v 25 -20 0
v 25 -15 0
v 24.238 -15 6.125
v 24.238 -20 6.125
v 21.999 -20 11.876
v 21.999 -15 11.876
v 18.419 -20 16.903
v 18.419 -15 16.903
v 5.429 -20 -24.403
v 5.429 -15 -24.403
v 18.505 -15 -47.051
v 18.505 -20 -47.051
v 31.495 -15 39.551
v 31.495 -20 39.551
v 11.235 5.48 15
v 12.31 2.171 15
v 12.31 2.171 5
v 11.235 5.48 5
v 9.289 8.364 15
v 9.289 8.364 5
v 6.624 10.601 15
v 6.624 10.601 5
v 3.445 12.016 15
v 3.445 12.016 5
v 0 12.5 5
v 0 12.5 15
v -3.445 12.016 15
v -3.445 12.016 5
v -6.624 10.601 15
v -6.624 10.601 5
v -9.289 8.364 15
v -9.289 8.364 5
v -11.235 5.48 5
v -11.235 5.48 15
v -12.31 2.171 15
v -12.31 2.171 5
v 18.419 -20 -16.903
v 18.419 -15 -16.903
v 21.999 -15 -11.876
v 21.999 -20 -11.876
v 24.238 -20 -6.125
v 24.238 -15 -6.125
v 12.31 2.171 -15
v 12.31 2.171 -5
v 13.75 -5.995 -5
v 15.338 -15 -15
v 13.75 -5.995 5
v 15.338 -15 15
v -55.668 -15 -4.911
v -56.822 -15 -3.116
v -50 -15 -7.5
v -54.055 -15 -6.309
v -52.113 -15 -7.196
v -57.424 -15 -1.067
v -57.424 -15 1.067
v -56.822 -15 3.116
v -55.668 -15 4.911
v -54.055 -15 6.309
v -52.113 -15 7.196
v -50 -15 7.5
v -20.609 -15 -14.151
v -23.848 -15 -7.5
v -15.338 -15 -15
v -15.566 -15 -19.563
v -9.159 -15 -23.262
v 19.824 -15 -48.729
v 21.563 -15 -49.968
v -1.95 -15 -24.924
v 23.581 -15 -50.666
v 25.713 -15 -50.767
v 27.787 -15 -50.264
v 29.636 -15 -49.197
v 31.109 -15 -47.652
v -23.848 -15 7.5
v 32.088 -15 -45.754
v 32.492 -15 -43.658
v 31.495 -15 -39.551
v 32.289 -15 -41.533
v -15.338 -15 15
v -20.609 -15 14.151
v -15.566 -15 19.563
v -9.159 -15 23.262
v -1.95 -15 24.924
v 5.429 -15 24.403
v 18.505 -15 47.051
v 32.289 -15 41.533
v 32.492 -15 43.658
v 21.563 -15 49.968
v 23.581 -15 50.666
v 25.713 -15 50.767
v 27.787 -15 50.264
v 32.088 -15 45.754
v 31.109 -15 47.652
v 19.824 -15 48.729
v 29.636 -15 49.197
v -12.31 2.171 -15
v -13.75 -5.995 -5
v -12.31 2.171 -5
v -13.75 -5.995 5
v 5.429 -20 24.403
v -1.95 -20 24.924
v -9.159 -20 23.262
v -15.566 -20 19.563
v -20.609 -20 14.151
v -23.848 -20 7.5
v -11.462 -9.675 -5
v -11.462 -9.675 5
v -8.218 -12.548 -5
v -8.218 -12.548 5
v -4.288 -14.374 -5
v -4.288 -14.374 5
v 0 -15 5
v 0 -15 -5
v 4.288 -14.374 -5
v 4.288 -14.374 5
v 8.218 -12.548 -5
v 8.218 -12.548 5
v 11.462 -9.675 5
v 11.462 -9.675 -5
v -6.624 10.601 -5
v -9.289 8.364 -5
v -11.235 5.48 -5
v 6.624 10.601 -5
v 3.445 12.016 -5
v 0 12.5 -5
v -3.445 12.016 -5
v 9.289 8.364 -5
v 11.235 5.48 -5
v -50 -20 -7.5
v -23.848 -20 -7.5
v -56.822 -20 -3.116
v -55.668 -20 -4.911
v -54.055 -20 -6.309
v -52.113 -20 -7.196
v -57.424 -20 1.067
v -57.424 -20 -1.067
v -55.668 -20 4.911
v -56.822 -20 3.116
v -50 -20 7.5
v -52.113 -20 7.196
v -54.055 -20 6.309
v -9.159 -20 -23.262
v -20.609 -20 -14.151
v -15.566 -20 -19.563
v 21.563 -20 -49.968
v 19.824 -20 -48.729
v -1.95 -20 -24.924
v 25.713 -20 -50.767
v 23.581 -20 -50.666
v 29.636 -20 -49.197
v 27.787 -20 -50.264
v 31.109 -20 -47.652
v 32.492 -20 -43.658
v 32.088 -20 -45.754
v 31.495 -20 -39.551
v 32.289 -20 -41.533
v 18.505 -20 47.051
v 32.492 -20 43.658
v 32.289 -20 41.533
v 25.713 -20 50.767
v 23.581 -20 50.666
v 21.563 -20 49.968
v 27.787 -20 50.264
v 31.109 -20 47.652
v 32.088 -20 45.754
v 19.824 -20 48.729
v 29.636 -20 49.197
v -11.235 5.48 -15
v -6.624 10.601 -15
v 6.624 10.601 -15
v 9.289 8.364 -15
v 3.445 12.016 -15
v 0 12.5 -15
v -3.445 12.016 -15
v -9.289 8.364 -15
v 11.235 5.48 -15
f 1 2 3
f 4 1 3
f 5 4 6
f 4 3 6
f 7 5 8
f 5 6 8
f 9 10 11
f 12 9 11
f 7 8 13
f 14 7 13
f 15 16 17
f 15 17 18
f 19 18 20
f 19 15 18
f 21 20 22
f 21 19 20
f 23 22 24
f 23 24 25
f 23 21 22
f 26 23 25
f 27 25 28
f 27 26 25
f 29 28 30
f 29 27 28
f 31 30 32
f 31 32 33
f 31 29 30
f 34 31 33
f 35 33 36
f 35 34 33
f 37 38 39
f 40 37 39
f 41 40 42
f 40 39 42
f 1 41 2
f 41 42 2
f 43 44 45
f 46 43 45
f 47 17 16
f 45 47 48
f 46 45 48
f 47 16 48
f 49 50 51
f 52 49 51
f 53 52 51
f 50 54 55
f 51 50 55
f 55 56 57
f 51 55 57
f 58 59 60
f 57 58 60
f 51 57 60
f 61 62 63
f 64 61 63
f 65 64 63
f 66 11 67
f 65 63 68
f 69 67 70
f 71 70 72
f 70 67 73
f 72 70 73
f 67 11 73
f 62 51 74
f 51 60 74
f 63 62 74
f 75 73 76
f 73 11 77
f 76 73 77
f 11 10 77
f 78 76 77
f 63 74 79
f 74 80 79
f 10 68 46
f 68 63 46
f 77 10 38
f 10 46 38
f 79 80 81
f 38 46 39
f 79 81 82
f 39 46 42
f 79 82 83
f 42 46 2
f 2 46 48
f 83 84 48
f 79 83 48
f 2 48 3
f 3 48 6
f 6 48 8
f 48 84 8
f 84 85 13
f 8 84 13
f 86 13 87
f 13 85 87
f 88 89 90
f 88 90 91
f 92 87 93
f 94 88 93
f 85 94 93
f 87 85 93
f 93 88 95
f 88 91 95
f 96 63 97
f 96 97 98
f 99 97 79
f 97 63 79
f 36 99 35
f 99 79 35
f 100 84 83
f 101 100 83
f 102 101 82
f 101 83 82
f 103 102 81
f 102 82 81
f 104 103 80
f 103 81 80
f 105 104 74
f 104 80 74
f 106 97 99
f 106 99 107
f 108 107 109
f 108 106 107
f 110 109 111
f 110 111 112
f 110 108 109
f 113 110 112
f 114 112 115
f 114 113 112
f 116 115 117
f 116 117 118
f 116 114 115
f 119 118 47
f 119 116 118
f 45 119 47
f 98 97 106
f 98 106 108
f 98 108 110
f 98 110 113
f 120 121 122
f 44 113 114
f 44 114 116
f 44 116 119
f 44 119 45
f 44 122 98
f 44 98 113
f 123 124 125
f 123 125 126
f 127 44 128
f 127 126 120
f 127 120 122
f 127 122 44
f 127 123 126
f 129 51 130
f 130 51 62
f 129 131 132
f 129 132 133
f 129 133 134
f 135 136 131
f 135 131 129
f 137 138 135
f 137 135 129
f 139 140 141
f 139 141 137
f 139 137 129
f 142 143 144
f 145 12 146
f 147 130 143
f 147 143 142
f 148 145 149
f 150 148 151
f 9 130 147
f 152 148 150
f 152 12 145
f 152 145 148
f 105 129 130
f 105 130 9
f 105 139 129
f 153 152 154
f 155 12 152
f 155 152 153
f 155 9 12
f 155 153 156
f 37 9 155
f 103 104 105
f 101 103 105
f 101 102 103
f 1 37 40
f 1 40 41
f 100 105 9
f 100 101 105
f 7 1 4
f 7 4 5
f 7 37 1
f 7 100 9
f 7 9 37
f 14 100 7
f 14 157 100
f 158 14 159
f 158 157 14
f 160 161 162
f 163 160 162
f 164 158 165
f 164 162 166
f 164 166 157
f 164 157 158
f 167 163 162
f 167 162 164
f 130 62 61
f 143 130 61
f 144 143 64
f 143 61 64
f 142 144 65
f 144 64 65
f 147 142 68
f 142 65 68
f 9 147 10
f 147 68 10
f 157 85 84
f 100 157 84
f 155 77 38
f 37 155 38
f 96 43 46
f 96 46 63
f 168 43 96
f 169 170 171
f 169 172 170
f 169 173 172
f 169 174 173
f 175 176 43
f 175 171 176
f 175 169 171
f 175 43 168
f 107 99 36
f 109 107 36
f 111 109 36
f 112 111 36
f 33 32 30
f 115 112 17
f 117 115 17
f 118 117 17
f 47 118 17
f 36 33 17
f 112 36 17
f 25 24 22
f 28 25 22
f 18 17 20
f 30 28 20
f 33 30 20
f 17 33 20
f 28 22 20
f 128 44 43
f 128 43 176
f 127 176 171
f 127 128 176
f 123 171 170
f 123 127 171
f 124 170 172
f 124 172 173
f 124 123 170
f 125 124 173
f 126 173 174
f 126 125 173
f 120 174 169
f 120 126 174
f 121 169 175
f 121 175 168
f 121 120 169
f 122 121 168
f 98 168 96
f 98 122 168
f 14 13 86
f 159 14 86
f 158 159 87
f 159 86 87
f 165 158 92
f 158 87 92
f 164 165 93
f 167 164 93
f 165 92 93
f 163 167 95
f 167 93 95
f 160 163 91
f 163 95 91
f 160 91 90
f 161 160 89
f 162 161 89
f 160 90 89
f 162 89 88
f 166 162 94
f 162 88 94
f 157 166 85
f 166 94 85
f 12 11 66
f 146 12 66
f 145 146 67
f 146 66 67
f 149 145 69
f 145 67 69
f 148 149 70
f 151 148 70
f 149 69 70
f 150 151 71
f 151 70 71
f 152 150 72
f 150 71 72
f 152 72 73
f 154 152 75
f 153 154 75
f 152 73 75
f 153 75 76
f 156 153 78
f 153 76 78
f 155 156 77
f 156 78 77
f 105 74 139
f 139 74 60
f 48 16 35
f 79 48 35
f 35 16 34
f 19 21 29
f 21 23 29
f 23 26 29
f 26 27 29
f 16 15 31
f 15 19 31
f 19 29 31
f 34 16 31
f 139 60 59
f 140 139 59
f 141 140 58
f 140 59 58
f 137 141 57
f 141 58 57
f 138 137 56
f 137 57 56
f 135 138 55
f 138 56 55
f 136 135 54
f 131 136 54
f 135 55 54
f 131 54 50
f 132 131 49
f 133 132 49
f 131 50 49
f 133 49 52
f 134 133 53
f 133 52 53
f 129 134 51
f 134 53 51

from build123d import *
from build123d.topology import SkipClean

# Parameters (mm, degrees)
BOSS_EXTRUDE1_DEPTH = 15
CUT_EXTRUDE1_DEPTH  = 5
BOSS_EXTRUDE2_DEPTH = 5
SKETCH3_R           = 15
CUT_EXTRUDE2_DEPTH  = 10


with BuildPart() as part:
    # Sketch1 → Boss-Extrude1 (new, symmetric)
    with BuildSketch(Plane.XY):
        with BuildLine():
            Line((-12.310096913, 2.170602221), (12.310096913, 2.170602221))
            ThreePointArc((12.310096913, 2.170602221), (0, -12.5), (-12.310096913, 2.170602221))
        make_face()
        with BuildLine():
            ThreePointArc((12.310096913, 2.170602221), (0, 12.5), (-12.310096913, 2.170602221))
            Line((-12.310096913, 2.170602221), (12.310096913, 2.170602221))
        make_face()
        with BuildLine():
            ThreePointArc((-12.310096913, 2.170602221), (0, -12.5), (12.310096913, 2.170602221))
            Line((12.310096913, 2.170602221), (15.337737359, -15))
            Line((15.337737359, -15), (-15.337737359, -15))
            Line((-15.337737359, -15), (-12.310096913, 2.170602221))
        make_face()
    extrude(amount=BOSS_EXTRUDE1_DEPTH, both=True)

    # Sketch1<3> → Cut-Extrude1 (cut, symmetric)
    with SkipClean():  # the faces are left unmerged after this step: merging them gives an invalid solid
        with BuildSketch(Plane.XY):
            with BuildLine():
                ThreePointArc((12.310096913, 2.170602221), (0, 12.5), (-12.310096913, 2.170602221))
                Line((-12.310096913, 2.170602221), (12.310096913, 2.170602221))
            make_face()
            with BuildLine():
                Line((-12.310096913, 2.170602221), (12.310096913, 2.170602221))
                ThreePointArc((12.310096913, 2.170602221), (0, -12.5), (-12.310096913, 2.170602221))
            make_face()
        extrude(amount=CUT_EXTRUDE1_DEPTH, both=True, mode=Mode.SUBTRACT)

    # Sketch2 → Boss-Extrude2 (add)
    with BuildSketch(Plane.XZ.offset(15)):
        with BuildLine():
            Line((-50, -7.5), (-23.848480035, -7.5))
            ThreePointArc((-23.848480035, -7.5), (-25, 0), (-23.848480035, 7.5))
            Line((-23.848480035, 7.5), (-50, 7.5))
            ThreePointArc((-50, 7.5), (-57.5, 0), (-50, -7.5))
        make_face()
        with BuildLine():
            Line((-23.848480035, -7.5), (-15.337737359, -7.5))
            Line((-15.337737359, -7.5), (-15.337737359, 7.5))
            Line((-15.337737359, 7.5), (-23.848480035, 7.5))
            ThreePointArc((-23.848480035, 7.5), (-25, 0), (-23.848480035, -7.5))
        make_face()
        with BuildLine():
            Line((-23.848480035, 7.5), (-15.337737359, 7.5))
            Line((-15.337737359, 7.5), (-15.337737359, 15))
            Line((-15.337737359, 15), (0, 15))
            Line((0, 15), (5.429049489, 24.403389552))
            ThreePointArc((5.429049489, 24.403389552), (-12.5, 21.650635095), (-23.848480035, 7.5))
        make_face()
        with BuildLine():
            ThreePointArc((5.429049489, 24.403389552), (12.5, 21.650635095), (18.419430546, 16.903389552))
            Line((18.419430546, 16.903389552), (31.495190528, 39.551270189))
            ThreePointArc((31.495190528, 39.551270189), (28.75, 49.796460718), (18.504809472, 47.051270189))
            Line((18.504809472, 47.051270189), (5.429049489, 24.403389552))
        make_face()
        with BuildLine():
            Line((15.337737359, 15), (15.337737359, 11.565740379))
            Line((15.337737359, 11.565740379), (18.419430546, 16.903389552))
            ThreePointArc((18.419430546, 16.903389552), (12.5, 21.650635095), (5.429049489, 24.403389552))
            Line((5.429049489, 24.403389552), (0, 15))
            Line((0, 15), (15.337737359, 15))
        make_face()
        with BuildLine():
            Line((18.419430546, 16.903389552), (15.337737359, 11.565740379))
            Line((15.337737359, 11.565740379), (15.337737359, -11.565740379))
            Line((15.337737359, -11.565740379), (18.419430546, -16.903389552))
            ThreePointArc((18.419430546, -16.903389552), (23.296842744, -9.069571003), (25, 0))
            ThreePointArc((25, 0), (23.296842744, 9.069571003), (18.419430546, 16.903389552))
        make_face()
        with BuildLine():
            ThreePointArc((6.495190528, -3.75), (3.75, -6.495190528), (0, -7.5))
            Line((0, -7.5), (-4.330127019, -7.5))
            Line((-4.330127019, -7.5), (0, -15))
            Line((0, -15), (15.337737359, -15))
            Line((15.337737359, -15), (15.337737359, -11.565740379))
            Line((15.337737359, -11.565740379), (8.660254038, 0))
            Line((8.660254038, 0), (6.495190528, -3.75))
        make_face()
        with BuildLine():
            Line((15.337737359, -15), (0, -15))
            Line((0, -15), (5.429049489, -24.403389552))
            ThreePointArc((5.429049489, -24.403389552), (12.5, -21.650635095), (18.419430546, -16.903389552))
            Line((18.419430546, -16.903389552), (15.337737359, -11.565740379))
            Line((15.337737359, -11.565740379), (15.337737359, -15))
        make_face()
        with BuildLine():
            ThreePointArc((18.419430546, -16.903389552), (12.5, -21.650635095), (5.429049489, -24.403389552))
            Line((5.429049489, -24.403389552), (18.504809472, -47.051270189))
            ThreePointArc((18.504809472, -47.051270189), (28.75, -49.796460718), (31.495190528, -39.551270189))
            Line((31.495190528, -39.551270189), (18.419430546, -16.903389552))
        make_face()
        with BuildLine():
            Line((-15.337737359, -15), (-15.337737359, -7.5))
            Line((-15.337737359, -7.5), (-23.848480035, -7.5))
            ThreePointArc((-23.848480035, -7.5), (-12.5, -21.650635095), (5.429049489, -24.403389552))
            Line((5.429049489, -24.403389552), (0, -15))
            Line((0, -15), (-15.337737359, -15))
        make_face()
        Polygon((0, -15), (-4.330127019, -7.5), (-15.337737359, -7.5), (-15.337737359, -15), align=None)
        with BuildLine():
            Line((-15.337737359, -7.5), (-4.330127019, -7.5))
            Line((-4.330127019, -7.5), (-6.495190528, -3.75))
            ThreePointArc((-6.495190528, -3.75), (-7.5, 0), (-6.495190528, 3.75))
            Line((-6.495190528, 3.75), (-4.330127019, 7.5))
            Line((-4.330127019, 7.5), (-15.337737359, 7.5))
            Line((-15.337737359, 7.5), (-15.337737359, -7.5))
        make_face()
        Polygon((-15.337737359, 15), (-15.337737359, 7.5), (-4.330127019, 7.5), (0, 15), align=None)
        with BuildLine():
            Line((6.495190528, 3.75), (8.660254038, 0))
            Line((8.660254038, 0), (15.337737359, 11.565740379))
            Line((15.337737359, 11.565740379), (15.337737359, 15))
            Line((15.337737359, 15), (0, 15))
            Line((0, 15), (-4.330127019, 7.5))
            Line((-4.330127019, 7.5), (0, 7.5))
            ThreePointArc((0, 7.5), (3.75, 6.495190528), (6.495190528, 3.75))
        make_face()
        Polygon((15.337737359, 11.565740379), (8.660254038, 0), (15.337737359, -11.565740379), align=None)
        with BuildLine():
            ThreePointArc((6.495190528, 3.75), (7.5, 0), (6.495190528, -3.75))
            Line((6.495190528, -3.75), (8.660254038, 0))
            Line((8.660254038, 0), (6.495190528, 3.75))
        make_face()
        with BuildLine():
            ThreePointArc((-6.495190528, -3.75), (-3.75, -6.495190528), (0, -7.5))
            ThreePointArc((0, -7.5), (3.75, -6.495190528), (6.495190528, -3.75))
            ThreePointArc((6.495190528, -3.75), (7.5, 0), (6.495190528, 3.75))
            ThreePointArc((6.495190528, 3.75), (3.75, 6.495190528), (0, 7.5))
            ThreePointArc((0, 7.5), (-3.75, 6.495190528), (-6.495190528, 3.75))
            ThreePointArc((-6.495190528, 3.75), (-7.5, 0), (-6.495190528, -3.75))
        make_face()
        with BuildLine():
            Line((-4.330127019, -7.5), (0, -7.5))
            ThreePointArc((0, -7.5), (-3.75, -6.495190528), (-6.495190528, -3.75))
            Line((-6.495190528, -3.75), (-4.330127019, -7.5))
        make_face()
        with BuildLine():
            Line((-4.330127019, 7.5), (-6.495190528, 3.75))
            ThreePointArc((-6.495190528, 3.75), (-3.75, 6.495190528), (0, 7.5))
            Line((0, 7.5), (-4.330127019, 7.5))
        make_face()
    extrude(amount=BOSS_EXTRUDE2_DEPTH)

    # Sketch3 → Cut-Extrude2 (cut)
    with BuildSketch(Plane.XY.offset(-5)):
        Circle(SKETCH3_R)
    extrude(amount=CUT_EXTRUDE2_DEPTH, mode=Mode.SUBTRACT)


solid = part.part
